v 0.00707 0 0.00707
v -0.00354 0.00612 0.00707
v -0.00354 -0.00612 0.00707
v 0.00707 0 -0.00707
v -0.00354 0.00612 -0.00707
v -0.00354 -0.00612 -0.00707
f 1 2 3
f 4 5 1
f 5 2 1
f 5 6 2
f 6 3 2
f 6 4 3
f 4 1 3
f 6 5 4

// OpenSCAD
include <params.scad>
assert(body_l > 0 && body_w > 0, "positive plate dims");
assert(ext_left <= clear_left, "left extent within door clearance");
assert(ext_down <= clear_down, "down extent within handle clearance");
assert(knob_w_top <= knob_w_base, "knob tapers base->top");
assert(knob_engage < knob_h, "engagement shallower than protrusion");
echo("params_test ok");
sphere(0.01, $fn = 3);
